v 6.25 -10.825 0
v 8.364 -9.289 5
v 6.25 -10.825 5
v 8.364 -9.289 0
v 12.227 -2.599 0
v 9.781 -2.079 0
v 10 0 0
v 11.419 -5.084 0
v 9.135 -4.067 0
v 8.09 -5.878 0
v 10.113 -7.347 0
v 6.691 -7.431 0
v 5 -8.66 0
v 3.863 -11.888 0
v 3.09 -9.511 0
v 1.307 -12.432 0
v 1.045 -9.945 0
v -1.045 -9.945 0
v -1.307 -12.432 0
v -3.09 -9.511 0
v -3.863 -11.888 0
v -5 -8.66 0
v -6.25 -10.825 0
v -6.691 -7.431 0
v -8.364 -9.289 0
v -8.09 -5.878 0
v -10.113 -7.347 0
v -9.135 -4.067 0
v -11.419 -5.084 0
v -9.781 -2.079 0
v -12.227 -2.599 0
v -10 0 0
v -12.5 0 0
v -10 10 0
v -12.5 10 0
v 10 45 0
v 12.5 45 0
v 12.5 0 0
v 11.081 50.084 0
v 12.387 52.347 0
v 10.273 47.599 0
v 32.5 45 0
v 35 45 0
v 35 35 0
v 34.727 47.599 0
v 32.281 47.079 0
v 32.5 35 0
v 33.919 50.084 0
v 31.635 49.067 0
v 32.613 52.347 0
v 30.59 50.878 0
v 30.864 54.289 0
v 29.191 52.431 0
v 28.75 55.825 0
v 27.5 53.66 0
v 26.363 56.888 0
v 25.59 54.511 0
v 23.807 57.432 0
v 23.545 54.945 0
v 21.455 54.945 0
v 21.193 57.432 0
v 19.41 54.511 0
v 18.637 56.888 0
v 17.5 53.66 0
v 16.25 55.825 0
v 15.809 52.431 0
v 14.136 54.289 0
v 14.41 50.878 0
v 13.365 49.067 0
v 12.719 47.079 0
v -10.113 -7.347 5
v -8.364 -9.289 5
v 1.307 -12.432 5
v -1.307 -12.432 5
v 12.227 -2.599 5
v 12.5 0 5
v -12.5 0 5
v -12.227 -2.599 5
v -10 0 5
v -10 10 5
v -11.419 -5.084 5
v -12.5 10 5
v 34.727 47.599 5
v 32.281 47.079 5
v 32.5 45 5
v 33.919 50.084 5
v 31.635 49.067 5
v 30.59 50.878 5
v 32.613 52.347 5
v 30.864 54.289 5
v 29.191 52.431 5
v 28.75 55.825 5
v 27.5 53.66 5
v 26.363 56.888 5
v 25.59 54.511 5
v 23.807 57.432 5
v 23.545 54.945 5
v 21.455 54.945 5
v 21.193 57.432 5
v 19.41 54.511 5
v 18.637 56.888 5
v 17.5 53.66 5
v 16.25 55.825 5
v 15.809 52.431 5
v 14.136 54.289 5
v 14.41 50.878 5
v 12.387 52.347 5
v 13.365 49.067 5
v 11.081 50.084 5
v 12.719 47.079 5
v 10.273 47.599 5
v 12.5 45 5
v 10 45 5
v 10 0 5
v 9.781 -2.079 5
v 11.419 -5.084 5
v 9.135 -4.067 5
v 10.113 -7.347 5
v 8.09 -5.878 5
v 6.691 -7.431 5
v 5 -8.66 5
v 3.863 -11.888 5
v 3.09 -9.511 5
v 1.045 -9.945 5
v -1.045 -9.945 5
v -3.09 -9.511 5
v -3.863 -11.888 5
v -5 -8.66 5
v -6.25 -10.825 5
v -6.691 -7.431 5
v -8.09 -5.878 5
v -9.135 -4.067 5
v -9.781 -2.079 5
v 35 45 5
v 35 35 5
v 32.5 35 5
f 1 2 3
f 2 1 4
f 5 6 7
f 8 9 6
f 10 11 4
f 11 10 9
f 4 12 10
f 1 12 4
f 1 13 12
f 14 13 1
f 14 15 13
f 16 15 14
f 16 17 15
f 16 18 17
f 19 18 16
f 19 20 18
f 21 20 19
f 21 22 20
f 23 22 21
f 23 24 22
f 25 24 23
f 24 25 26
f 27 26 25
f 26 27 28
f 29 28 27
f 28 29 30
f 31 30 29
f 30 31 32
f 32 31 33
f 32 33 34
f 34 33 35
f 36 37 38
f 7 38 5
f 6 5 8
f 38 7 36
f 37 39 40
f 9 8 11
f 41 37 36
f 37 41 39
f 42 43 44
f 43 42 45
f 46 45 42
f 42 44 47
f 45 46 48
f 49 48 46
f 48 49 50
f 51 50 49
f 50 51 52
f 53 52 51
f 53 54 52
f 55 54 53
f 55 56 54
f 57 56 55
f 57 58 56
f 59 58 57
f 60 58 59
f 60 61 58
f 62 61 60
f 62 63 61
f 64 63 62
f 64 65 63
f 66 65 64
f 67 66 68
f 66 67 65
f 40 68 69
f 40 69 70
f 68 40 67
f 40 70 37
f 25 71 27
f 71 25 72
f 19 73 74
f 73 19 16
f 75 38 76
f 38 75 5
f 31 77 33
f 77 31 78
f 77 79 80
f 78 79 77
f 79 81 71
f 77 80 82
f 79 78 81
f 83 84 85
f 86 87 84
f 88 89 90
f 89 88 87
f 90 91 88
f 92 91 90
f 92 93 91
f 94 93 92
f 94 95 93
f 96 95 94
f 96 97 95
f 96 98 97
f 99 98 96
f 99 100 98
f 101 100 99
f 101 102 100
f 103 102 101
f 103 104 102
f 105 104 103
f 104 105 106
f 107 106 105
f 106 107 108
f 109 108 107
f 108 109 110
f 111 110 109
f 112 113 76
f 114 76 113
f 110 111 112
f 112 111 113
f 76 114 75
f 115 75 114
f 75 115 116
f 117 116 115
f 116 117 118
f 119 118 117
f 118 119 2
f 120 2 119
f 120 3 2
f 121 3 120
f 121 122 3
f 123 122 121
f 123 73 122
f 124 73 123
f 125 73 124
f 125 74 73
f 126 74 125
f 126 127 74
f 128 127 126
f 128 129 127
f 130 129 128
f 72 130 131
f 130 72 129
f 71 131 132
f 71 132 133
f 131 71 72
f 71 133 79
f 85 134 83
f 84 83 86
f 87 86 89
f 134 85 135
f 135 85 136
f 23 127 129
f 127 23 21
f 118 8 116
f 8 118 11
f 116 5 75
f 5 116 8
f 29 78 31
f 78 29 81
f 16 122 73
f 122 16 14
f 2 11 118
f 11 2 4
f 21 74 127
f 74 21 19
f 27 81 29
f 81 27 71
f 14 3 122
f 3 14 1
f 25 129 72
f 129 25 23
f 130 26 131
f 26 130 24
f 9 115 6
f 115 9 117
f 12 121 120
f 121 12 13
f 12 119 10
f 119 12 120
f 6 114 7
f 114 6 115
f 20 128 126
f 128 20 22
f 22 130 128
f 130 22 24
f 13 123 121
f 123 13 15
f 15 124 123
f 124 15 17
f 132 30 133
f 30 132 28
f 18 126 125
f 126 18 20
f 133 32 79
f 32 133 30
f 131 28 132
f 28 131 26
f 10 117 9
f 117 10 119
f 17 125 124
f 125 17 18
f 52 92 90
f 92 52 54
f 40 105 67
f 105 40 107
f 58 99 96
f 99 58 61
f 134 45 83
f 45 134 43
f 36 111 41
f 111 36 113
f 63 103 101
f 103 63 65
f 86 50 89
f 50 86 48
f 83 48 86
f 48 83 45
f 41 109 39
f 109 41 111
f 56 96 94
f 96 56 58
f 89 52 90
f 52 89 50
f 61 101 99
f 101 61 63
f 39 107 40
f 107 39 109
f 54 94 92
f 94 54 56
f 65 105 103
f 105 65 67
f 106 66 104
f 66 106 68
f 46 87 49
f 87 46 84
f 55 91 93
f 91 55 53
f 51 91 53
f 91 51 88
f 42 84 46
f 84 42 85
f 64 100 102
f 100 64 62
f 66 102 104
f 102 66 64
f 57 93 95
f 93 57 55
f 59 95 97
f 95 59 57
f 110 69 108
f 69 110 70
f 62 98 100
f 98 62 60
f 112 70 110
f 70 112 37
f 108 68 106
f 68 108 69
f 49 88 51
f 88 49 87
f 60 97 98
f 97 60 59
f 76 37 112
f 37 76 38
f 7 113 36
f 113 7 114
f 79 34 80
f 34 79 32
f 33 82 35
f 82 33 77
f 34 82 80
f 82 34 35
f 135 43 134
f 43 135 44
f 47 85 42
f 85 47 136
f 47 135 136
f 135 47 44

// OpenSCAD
module _halfcircle(r_o, r_i, h) {
  difference() {
    cylinder(r=r_o, h=h);
    cylinder(r=r_i, h=h);
    translate([-r_o, 0, 0])cube([2*r_o, 2*r_o, h]);
  }
}

module ikea_kitchen_hook(r_o=12.5, xy_thickness=2.5, z_thickness=5, straight_length=45, hook_tip_length=10) {
  // maximum length of hook is r_o + r_o + straight_length
  /*translate([0, -r_o, 4])cube([2, 2*r_o + straight_length, 2]);*/
  // maximum width of hook is 4 * r_o - xy_thickness
  /*translate([-r_o, 50, 4])cube([4*r_o - xy_thickness, 2, 2]);*/

  r_i = r_o-xy_thickness;
  union() {
    _halfcircle(r_o, r_i, h=z_thickness);
    translate([r_i, 0, 0])cube([xy_thickness, straight_length, z_thickness]);
    translate([2*r_i+xy_thickness, straight_length, z_thickness])rotate([180, 0, 0])
      _halfcircle(r_o, r_i, h=z_thickness);

    // add longer ends
    translate([-r_i-xy_thickness, 0, 0])cube([xy_thickness, hook_tip_length, z_thickness]);
    translate([2*r_i+xy_thickness, straight_length-hook_tip_length, 0])translate([r_i, 0, 0])
      cube([xy_thickness, hook_tip_length, z_thickness]);
  }
}

ikea_kitchen_hook(); // make me
